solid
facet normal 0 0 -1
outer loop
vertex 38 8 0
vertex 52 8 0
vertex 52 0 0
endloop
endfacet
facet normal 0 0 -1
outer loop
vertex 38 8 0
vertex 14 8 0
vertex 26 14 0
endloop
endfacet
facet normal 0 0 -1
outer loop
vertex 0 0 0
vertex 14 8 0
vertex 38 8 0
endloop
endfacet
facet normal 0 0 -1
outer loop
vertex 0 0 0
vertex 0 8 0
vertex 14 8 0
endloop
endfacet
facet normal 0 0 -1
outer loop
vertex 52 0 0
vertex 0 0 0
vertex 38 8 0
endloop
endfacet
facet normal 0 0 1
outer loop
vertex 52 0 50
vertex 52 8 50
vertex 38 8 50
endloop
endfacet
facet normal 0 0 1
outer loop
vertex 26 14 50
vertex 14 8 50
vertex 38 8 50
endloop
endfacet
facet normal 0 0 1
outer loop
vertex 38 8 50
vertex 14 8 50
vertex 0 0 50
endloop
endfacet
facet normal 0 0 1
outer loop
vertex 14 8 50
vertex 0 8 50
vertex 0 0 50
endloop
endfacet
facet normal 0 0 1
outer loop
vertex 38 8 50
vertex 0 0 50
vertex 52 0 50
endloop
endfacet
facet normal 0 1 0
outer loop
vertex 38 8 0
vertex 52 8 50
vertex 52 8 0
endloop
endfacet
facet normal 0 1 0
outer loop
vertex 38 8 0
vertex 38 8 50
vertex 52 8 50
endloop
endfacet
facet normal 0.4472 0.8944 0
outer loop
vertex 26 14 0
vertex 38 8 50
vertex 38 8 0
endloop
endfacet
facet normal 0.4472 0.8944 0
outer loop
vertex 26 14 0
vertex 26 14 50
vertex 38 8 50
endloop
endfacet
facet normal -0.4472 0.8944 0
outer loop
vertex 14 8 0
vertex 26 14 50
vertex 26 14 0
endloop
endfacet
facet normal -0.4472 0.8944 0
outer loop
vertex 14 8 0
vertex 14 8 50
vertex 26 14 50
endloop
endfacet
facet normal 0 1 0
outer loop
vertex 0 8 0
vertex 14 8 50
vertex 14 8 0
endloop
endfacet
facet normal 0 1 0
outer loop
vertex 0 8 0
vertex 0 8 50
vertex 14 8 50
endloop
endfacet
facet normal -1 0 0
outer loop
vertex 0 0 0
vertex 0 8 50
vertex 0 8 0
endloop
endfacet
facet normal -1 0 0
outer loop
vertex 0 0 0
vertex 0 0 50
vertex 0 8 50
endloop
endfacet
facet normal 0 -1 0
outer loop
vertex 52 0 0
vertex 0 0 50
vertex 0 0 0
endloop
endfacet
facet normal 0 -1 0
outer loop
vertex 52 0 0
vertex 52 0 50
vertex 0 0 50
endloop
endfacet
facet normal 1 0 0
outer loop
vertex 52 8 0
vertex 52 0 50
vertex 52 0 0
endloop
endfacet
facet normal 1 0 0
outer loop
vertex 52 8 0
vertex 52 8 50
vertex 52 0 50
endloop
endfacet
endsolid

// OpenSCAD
$fn = 32;

// ----------------------------------------------------------------------
// V guide rail: vrib, 52 mm wide
// ----------------------------------------------------------------------

// --- parameters (mm) ---
rail_w = 52;              // rail width, X
base_t = 8;               // base plate thickness
v_depth = 6;              // V feature depth / height
v_half_w = 12;            // half width of the V at the base face
plate_t = 50;             // rail length, Z (the extrusion height)

profile = [[0, 0], [52, 0], [52, 8], [38, 8], [26, 14], [14, 8], [0, 8]];  // primary outline, 7 points, counter clockwise

// --- the one profile operation ---
linear_extrude(height = plate_t) polygon(points = profile);
